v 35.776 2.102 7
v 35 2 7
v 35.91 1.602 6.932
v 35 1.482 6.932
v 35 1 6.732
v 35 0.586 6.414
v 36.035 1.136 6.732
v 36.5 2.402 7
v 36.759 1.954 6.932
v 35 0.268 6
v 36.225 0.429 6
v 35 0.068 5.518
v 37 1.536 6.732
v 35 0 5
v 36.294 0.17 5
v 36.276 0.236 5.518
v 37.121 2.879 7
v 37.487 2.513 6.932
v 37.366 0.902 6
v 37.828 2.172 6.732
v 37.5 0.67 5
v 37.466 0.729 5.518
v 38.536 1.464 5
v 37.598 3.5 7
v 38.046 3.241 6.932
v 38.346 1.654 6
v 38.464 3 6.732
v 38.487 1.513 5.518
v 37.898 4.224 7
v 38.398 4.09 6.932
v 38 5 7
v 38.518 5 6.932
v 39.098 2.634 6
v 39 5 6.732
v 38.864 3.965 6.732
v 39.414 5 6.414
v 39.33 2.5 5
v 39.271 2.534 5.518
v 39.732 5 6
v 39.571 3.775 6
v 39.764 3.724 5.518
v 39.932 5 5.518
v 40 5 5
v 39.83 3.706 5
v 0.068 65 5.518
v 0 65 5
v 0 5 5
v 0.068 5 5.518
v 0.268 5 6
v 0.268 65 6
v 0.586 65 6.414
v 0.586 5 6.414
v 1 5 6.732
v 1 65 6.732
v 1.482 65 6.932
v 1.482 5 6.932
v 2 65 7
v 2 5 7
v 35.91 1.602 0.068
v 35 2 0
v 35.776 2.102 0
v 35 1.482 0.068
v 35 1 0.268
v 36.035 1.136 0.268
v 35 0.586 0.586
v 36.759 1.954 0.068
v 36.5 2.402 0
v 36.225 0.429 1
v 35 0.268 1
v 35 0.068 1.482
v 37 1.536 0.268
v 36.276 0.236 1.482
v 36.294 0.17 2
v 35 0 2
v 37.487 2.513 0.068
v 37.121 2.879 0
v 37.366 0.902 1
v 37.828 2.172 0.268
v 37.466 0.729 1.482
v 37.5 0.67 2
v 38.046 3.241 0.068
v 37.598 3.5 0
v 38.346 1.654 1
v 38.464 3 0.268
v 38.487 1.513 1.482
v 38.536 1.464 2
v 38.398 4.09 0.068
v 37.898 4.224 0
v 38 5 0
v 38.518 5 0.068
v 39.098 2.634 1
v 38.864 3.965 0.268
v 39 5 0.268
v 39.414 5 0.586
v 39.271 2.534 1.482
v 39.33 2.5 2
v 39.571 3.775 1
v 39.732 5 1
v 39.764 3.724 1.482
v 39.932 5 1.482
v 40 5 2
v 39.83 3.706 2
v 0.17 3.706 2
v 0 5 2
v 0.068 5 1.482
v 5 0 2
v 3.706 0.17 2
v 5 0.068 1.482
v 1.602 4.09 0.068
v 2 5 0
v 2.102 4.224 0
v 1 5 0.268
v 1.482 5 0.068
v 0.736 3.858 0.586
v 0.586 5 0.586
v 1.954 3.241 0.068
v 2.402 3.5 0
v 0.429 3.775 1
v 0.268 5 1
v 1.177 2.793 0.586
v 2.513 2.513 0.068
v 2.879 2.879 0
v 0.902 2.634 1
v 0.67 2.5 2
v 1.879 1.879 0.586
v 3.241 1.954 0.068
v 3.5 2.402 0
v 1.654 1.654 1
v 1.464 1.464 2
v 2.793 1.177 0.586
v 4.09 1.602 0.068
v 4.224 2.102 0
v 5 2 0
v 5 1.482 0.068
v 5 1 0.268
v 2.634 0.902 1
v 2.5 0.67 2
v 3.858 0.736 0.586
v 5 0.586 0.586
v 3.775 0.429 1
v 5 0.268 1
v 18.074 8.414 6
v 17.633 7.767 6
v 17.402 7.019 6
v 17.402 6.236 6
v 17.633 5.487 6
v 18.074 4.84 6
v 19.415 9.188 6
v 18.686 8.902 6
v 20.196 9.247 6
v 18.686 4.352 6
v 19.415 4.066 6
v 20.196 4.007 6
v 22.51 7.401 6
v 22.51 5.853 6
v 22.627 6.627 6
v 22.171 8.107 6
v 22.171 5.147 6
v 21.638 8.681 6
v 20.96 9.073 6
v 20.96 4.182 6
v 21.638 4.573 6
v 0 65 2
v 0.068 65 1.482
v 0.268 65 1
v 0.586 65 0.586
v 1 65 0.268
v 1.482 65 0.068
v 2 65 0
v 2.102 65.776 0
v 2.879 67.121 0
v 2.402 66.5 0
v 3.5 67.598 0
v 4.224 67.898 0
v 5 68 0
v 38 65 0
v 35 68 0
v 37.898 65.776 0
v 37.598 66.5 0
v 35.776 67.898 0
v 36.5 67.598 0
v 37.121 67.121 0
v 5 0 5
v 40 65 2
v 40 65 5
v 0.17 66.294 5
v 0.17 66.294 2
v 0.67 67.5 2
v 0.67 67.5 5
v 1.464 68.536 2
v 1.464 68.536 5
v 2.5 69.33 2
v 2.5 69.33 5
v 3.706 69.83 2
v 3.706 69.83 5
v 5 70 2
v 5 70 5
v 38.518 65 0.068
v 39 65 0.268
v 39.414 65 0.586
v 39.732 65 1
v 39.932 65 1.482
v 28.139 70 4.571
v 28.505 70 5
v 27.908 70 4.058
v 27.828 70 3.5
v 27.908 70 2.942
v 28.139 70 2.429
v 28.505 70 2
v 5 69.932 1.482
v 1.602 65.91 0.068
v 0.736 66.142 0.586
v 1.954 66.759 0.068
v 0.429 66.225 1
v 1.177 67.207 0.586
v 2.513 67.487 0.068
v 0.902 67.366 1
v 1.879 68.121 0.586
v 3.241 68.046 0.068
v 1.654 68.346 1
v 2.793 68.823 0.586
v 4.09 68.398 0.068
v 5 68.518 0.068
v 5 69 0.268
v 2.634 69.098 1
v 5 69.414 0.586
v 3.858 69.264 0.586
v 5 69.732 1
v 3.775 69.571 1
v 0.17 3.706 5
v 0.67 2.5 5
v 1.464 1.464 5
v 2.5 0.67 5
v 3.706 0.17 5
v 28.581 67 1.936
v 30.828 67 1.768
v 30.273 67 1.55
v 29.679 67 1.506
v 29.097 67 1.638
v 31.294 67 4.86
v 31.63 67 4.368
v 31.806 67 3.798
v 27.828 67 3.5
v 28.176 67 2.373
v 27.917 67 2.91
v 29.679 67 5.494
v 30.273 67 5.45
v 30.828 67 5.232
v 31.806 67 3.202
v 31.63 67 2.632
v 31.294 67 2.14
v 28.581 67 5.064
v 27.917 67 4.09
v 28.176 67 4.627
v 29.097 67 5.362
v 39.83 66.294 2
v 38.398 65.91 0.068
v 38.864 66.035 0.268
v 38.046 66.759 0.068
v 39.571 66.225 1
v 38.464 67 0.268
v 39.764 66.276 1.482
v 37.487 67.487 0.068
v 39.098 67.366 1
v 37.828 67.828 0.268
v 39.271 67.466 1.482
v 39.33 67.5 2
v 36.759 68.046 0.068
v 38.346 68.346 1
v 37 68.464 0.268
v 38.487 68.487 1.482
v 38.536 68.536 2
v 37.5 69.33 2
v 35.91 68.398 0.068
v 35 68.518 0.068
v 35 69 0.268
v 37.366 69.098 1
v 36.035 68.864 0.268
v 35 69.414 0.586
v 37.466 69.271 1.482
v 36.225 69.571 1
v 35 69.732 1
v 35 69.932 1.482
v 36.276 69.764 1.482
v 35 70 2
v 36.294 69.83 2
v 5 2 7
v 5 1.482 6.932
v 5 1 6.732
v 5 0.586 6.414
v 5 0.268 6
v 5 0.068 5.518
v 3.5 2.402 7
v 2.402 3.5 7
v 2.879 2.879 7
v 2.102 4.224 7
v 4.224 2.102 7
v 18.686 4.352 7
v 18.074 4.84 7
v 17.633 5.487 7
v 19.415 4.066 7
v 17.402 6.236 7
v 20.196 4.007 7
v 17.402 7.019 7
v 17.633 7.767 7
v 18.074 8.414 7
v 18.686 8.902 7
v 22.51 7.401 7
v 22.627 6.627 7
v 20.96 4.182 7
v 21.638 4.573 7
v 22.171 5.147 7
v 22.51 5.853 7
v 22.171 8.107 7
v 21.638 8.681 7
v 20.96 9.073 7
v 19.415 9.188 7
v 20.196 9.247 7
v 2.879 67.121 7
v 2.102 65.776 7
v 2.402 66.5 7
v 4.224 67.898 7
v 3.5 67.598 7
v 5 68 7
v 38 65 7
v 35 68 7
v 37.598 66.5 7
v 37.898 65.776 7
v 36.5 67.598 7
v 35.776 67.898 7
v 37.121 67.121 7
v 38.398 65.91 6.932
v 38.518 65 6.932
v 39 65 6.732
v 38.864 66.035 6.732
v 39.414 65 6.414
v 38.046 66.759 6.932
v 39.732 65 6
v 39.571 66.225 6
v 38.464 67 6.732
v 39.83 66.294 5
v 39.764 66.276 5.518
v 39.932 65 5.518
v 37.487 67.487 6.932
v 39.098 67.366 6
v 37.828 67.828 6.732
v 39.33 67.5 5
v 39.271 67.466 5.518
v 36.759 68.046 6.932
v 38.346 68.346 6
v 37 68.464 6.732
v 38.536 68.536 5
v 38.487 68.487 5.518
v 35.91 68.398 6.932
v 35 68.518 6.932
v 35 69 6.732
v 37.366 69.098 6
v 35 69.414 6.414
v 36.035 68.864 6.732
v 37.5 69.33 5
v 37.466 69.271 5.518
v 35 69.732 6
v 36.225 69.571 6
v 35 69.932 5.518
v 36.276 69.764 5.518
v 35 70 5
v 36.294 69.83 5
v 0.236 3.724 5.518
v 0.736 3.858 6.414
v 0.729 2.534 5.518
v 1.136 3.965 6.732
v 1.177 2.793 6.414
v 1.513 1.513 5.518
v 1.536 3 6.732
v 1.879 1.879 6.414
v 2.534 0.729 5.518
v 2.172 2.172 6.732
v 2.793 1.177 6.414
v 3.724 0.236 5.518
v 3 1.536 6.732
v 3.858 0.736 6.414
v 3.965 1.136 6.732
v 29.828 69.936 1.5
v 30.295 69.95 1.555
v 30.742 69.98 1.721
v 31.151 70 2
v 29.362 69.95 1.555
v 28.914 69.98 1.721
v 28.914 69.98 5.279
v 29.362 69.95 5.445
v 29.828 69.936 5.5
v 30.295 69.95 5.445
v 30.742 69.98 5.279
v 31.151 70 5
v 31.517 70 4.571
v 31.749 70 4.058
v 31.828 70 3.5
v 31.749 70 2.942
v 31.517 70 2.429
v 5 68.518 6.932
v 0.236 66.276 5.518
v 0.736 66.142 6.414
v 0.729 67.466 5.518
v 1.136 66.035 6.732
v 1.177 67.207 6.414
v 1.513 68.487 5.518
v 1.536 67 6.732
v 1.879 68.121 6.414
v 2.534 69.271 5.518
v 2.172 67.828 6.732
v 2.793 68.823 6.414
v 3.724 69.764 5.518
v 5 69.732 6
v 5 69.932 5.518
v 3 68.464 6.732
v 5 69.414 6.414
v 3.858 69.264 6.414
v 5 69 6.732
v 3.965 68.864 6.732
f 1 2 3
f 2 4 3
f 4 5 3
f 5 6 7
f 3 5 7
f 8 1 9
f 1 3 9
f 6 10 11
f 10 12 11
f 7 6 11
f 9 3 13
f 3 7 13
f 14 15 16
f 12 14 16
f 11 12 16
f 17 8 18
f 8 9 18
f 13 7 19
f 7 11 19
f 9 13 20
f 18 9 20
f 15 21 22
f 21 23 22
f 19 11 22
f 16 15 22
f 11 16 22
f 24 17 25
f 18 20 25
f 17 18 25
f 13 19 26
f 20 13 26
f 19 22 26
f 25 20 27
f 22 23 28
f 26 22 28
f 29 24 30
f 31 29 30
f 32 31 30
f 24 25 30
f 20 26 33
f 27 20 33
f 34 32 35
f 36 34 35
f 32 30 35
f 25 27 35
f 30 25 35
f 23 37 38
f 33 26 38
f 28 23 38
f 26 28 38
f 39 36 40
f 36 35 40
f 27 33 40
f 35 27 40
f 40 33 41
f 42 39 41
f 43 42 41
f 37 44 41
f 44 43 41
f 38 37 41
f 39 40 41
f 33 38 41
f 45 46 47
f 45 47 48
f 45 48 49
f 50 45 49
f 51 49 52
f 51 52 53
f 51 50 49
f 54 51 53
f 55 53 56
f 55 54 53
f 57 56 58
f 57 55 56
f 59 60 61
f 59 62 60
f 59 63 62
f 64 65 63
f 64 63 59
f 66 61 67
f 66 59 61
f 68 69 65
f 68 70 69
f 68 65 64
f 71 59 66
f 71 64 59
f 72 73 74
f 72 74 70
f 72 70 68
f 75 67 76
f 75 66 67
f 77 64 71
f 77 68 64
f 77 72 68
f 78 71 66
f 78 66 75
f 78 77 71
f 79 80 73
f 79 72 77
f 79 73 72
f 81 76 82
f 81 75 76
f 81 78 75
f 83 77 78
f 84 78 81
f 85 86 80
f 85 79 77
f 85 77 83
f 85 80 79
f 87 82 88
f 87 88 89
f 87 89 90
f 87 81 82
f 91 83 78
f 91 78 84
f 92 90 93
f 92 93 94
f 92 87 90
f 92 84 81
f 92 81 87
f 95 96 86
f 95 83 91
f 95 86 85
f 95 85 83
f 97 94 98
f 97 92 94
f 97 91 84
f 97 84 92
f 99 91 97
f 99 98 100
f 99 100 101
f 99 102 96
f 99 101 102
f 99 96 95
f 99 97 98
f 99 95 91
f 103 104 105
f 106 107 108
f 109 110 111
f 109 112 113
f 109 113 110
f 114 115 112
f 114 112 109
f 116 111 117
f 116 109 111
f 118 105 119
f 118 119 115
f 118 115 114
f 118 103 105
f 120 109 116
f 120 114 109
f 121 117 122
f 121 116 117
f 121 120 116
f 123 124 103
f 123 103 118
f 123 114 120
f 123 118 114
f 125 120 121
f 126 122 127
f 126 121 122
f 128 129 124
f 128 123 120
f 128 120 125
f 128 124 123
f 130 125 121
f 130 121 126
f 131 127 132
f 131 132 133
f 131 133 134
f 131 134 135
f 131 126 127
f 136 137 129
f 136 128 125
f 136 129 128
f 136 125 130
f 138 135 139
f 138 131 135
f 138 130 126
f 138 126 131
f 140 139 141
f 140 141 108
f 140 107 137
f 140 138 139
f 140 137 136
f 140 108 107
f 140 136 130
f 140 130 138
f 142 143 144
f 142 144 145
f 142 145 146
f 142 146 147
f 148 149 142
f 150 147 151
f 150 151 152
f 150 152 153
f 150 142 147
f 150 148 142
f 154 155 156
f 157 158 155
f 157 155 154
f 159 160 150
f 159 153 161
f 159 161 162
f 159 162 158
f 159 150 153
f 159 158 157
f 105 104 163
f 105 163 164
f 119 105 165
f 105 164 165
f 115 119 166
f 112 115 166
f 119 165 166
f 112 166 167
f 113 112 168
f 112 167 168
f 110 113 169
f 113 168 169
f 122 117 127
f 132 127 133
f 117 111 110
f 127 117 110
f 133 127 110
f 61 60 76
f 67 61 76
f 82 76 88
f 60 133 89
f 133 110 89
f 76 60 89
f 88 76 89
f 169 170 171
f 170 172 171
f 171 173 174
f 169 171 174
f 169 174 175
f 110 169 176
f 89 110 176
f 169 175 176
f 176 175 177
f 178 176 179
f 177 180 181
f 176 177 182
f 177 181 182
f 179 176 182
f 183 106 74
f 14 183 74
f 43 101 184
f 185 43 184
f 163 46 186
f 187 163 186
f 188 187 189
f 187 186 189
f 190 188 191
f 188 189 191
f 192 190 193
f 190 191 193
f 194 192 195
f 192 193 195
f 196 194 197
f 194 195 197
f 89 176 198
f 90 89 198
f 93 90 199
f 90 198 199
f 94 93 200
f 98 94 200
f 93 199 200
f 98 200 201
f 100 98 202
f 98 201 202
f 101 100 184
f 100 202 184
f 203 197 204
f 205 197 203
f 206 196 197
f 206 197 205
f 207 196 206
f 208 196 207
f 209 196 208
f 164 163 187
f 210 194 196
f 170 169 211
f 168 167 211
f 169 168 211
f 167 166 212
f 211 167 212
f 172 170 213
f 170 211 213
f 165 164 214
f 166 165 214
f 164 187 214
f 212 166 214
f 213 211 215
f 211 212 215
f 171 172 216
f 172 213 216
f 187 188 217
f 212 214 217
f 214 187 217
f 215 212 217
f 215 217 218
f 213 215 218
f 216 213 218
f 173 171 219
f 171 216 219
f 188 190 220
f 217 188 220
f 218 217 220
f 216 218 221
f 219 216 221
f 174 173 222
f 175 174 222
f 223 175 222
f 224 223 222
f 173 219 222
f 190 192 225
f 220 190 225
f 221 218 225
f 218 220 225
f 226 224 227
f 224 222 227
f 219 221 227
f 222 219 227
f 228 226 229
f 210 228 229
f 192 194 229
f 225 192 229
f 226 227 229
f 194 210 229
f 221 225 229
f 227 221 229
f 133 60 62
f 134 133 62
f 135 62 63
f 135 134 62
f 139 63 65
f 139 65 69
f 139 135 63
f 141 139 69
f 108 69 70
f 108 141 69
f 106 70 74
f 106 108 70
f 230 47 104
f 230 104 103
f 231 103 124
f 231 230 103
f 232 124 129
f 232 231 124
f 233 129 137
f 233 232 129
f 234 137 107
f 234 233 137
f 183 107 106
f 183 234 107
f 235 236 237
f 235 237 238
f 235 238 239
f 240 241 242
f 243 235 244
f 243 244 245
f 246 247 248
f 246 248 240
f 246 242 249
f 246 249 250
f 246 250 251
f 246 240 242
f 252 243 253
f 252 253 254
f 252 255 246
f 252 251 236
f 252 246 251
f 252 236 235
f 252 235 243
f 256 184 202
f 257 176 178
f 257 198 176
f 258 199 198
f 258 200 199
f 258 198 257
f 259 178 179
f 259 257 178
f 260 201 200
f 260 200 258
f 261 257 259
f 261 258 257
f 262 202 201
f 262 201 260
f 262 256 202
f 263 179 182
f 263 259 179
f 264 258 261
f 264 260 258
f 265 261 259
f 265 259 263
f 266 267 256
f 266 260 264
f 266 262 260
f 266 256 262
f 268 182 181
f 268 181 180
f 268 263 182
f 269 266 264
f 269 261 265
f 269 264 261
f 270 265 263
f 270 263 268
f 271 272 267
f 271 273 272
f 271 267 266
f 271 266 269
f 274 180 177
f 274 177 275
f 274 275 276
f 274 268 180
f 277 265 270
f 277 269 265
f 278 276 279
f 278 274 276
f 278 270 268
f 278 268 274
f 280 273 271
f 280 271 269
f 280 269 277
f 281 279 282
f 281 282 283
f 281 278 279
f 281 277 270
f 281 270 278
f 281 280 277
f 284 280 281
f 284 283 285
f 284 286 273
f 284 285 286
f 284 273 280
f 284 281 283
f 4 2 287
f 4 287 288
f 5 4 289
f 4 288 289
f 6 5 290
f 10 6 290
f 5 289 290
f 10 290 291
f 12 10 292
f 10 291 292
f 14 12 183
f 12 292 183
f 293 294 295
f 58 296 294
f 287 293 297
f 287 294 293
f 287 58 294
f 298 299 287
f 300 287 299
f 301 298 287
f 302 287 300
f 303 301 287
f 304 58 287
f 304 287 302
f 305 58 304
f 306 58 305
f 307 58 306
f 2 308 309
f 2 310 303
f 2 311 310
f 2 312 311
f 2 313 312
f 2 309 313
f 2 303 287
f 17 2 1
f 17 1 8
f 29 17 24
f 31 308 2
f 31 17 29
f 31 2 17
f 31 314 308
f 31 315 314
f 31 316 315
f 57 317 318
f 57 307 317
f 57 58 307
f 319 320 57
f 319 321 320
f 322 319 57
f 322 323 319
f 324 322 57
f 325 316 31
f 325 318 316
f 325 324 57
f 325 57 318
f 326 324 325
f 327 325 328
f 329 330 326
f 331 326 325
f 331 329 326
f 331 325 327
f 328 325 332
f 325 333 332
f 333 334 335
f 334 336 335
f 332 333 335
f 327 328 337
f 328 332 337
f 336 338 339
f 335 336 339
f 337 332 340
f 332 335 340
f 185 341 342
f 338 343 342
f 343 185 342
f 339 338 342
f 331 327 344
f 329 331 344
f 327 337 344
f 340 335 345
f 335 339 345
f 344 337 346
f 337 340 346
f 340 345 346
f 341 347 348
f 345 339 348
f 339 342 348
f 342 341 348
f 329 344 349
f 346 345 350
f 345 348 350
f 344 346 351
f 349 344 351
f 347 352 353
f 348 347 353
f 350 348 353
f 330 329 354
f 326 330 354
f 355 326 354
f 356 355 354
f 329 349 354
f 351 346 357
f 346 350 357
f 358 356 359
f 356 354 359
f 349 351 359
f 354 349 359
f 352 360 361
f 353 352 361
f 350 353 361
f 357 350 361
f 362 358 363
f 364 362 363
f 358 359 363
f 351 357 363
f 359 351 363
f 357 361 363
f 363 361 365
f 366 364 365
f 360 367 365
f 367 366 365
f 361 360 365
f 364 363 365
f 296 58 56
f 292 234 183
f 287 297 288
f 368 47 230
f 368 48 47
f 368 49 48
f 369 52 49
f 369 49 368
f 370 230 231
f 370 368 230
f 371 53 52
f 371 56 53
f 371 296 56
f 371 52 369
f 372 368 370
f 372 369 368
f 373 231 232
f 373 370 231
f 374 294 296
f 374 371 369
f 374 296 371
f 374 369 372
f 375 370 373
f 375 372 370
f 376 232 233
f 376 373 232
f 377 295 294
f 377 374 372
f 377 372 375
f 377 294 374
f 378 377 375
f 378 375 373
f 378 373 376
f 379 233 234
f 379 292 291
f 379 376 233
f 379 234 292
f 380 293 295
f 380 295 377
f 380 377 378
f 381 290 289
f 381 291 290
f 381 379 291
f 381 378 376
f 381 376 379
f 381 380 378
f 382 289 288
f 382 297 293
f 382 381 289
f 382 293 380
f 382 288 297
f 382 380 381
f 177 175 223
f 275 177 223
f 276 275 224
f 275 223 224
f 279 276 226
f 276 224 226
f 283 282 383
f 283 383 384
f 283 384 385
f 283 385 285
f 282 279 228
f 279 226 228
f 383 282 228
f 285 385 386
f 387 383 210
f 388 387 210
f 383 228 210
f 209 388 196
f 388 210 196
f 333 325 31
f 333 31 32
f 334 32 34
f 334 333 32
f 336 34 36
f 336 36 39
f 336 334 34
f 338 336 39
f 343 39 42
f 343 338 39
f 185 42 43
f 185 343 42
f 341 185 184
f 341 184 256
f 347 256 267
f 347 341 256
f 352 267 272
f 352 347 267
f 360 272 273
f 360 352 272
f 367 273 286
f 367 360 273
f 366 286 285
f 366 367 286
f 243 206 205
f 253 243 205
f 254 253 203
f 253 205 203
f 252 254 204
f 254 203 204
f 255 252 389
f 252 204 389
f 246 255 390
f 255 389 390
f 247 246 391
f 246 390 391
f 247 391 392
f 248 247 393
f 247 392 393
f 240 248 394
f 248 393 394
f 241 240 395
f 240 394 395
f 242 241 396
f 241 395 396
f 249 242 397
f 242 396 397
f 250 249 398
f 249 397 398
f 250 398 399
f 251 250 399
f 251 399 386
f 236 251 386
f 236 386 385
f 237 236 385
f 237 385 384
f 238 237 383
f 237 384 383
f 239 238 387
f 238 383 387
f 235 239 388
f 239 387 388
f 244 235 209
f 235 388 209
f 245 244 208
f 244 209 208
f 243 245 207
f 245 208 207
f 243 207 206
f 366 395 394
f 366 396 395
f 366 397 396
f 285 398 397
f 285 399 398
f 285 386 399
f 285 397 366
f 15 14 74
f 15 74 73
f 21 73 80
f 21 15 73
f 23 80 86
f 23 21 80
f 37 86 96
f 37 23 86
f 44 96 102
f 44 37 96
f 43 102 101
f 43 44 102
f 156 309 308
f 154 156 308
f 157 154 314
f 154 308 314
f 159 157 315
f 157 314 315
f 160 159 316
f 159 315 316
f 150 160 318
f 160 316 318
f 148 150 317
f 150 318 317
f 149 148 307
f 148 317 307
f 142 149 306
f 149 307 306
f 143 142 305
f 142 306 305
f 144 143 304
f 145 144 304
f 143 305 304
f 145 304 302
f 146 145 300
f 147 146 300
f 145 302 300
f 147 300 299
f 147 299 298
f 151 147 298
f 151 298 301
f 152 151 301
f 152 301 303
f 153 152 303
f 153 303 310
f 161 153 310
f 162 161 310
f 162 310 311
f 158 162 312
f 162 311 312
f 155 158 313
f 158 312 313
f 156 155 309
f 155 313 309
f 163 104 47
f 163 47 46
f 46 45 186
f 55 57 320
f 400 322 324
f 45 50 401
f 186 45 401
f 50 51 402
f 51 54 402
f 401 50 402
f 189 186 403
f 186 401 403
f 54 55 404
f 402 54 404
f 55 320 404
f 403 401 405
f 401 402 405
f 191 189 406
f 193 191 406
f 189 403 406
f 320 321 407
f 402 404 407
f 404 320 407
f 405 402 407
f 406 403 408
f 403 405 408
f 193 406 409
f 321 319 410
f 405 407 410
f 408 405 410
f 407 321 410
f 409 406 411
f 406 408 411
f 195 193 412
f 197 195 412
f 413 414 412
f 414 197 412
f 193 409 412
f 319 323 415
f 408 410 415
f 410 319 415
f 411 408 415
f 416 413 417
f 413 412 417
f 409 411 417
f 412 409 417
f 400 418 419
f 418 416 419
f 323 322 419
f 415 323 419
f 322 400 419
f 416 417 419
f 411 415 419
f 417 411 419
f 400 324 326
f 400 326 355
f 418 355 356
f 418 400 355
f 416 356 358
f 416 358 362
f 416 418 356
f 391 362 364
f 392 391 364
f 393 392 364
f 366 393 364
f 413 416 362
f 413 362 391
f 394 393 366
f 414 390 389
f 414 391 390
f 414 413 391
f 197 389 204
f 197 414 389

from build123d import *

# Parameters (mm, degrees)
F0_W         = 40
F0_H         = 70
F1_DEPTH     = 7
F2_R         = 5
F3_R         = 2
F4_DEPTH     = 3
F5_T1_DEPTH  = 60
F5_T3_DEPTH  = 30
F5_T6_ANGLE  = 90
F5_T8_ANGLE  = 90
F5_T10_ANGLE = 90
F5_T12_ANGLE = 90
F5_T14_ANGLE = 90
F5_T16_ANGLE = 90
F5_T18_ANGLE = 90
F5_T20_ANGLE = 90
F6_R         = 2.6271107644
F7_DEPTH     = 1


# Not quite as in the source:
# - a fillet or chamfer that OpenCascade refuses, or shapes differently, is made with other operations: its cross-section is extruded or revolved along the edge and cut away or added


with BuildPart() as f1:
    # F0 (on Top) → F1 (new body)
    with BuildSketch(Plane.XY):
        with Locations((20, 35)):
            Rectangle(F0_W, F0_H)
    extrude(amount=F1_DEPTH)

    # F2
    f2_edges = [f1.edges().sort_by_distance(p)[0] for p in [
        (40, 70, 3.5),
        (0, 70, 3.5),
        (40, 0, 3.5),
        (0, 0, 3.5),
    ]]
    fillet(f2_edges, radius=F2_R)

    # F3 (on face) → F4 (cut)
    with BuildSketch(Plane(origin=(0, 70, 0), x_dir=(-1, 0, 0), z_dir=(0, 1, 0))):
        with Locations((-29.8281734893, 3.5)):
            Circle(F3_R)
    extrude(amount=-F4_DEPTH, mode=Mode.SUBTRACT)

    # F5: fillet of radius 2 on 16 edges, made by hand

    # F5_s2 → F5_t1 (cut)
    with BuildSketch(Plane.XZ.offset(-65)):
        with BuildLine():
            ThreePointArc((0, 5), (0.5857864376, 6.4142135624), (2, 7))
            Line((2, 7), (0, 7))
            Line((0, 7), (0, 5))
        make_face()
        with BuildLine():
            ThreePointArc((0, 2), (0.5857864376, 0.5857864376), (2, 0))
            Line((2, 0), (0, 0))
            Line((0, 0), (0, 2))
        make_face()
        with BuildLine():
            ThreePointArc((38, 0), (39.4142135624, 0.5857864376), (40, 2))
            Line((40, 2), (40, 0))
            Line((40, 0), (38, 0))
        make_face()
        with BuildLine():
            ThreePointArc((38, 7), (39.4142135624, 6.4142135624), (40, 5))
            Line((40, 5), (40, 7))
            Line((40, 7), (38, 7))
        make_face()
    extrude(amount=F5_T1_DEPTH, mode=Mode.SUBTRACT)

    # F5_s4 → F5_t3 (cut)
    with BuildSketch(Plane.YZ.offset(5)):
        with BuildLine():
            ThreePointArc((68, 0), (69.4142135624, 0.5857864376), (70, 2))
            Line((70, 2), (70, 0))
            Line((70, 0), (68, 0))
        make_face()
        with BuildLine():
            ThreePointArc((2, 0), (0.5857864376, 0.5857864376), (0, 2))
            Line((0, 2), (0, 0))
            Line((0, 0), (2, 0))
        make_face()
        with BuildLine():
            ThreePointArc((68, 7), (69.4142135624, 6.4142135624), (70, 5))
            Line((70, 5), (70, 7))
            Line((70, 7), (68, 7))
        make_face()
        with BuildLine():
            ThreePointArc((2, 7), (0.5857864376, 6.4142135624), (0, 5))
            Line((0, 5), (0, 7))
            Line((0, 7), (2, 7))
        make_face()
    extrude(amount=F5_T3_DEPTH, mode=Mode.SUBTRACT)

    # F5_s5 → F5_t6 (revolve, cut)
    with BuildSketch(Plane.XZ.offset(-65)):
        with BuildLine():
            ThreePointArc((2, 0), (0.5857864376, 0.5857864376), (0, 2))
            Line((0, 2), (0, 0))
            Line((0, 0), (2, 0))
        make_face()
    revolve(axis=Axis((5, 65, 0), (0, 0, -1)), revolution_arc=F5_T6_ANGLE, mode=Mode.SUBTRACT)

    # F5_s7 → F5_t8 (revolve, cut)
    with BuildSketch(Plane.XZ.offset(-5)):
        with BuildLine():
            ThreePointArc((2, 0), (0.5857864376, 0.5857864376), (0, 2))
            Line((0, 2), (0, 0))
            Line((0, 0), (2, 0))
        make_face()
    revolve(axis=Axis((5, 5, 0), (0, 0, 1)), revolution_arc=F5_T8_ANGLE, mode=Mode.SUBTRACT)

    # F5_s9 → F5_t10 (revolve, cut)
    with BuildSketch(Plane.XZ.offset(-65)):
        with BuildLine():
            ThreePointArc((38, 0), (39.4142135624, 0.5857864376), (40, 2))
            Line((40, 2), (40, 0))
            Line((40, 0), (38, 0))
        make_face()
    revolve(axis=Axis((35, 65, 0), (0, 0, 1)), revolution_arc=F5_T10_ANGLE, mode=Mode.SUBTRACT)

    # F5_s11 → F5_t12 (revolve, cut)
    with BuildSketch(Plane.YZ.offset(35)):
        with BuildLine():
            ThreePointArc((2, 0), (0.5857864376, 0.5857864376), (0, 2))
            Line((0, 2), (0, 0))
            Line((0, 0), (2, 0))
        make_face()
    revolve(axis=Axis((35, 5, 0), (0, 0, 1)), revolution_arc=F5_T12_ANGLE, mode=Mode.SUBTRACT)

    # F5_s13 → F5_t14 (revolve, cut)
    with BuildSketch(Plane.XZ.offset(-65)):
        with BuildLine():
            ThreePointArc((0, 5), (0.5857864376, 6.4142135624), (2, 7))
            Line((2, 7), (0, 7))
            Line((0, 7), (0, 5))
        make_face()
    revolve(axis=Axis((5, 65, 7), (0, 0, -1)), revolution_arc=F5_T14_ANGLE, mode=Mode.SUBTRACT)

    # F5_s15 → F5_t16 (revolve, cut)
    with BuildSketch(Plane.XZ.offset(-5)):
        with BuildLine():
            ThreePointArc((0, 5), (0.5857864376, 6.4142135624), (2, 7))
            Line((2, 7), (0, 7))
            Line((0, 7), (0, 5))
        make_face()
    revolve(axis=Axis((5, 5, 7), (0, 0, 1)), revolution_arc=F5_T16_ANGLE, mode=Mode.SUBTRACT)

    # F5_s17 → F5_t18 (revolve, cut)
    with BuildSketch(Plane.XZ.offset(-65)):
        with BuildLine():
            ThreePointArc((38, 7), (39.4142135624, 6.4142135624), (40, 5))
            Line((40, 5), (40, 7))
            Line((40, 7), (38, 7))
        make_face()
    revolve(axis=Axis((35, 65, 7), (0, 0, 1)), revolution_arc=F5_T18_ANGLE, mode=Mode.SUBTRACT)

    # F5_s19 → F5_t20 (revolve, cut)
    with BuildSketch(Plane.YZ.offset(35)):
        with BuildLine():
            ThreePointArc((2, 7), (0.5857864376, 6.4142135624), (0, 5))
            Line((0, 5), (0, 7))
            Line((0, 7), (2, 7))
        make_face()
    revolve(axis=Axis((35, 5, 7), (0, 0, 1)), revolution_arc=F5_T20_ANGLE, mode=Mode.SUBTRACT)

    # F6 (on face) → F7 (cut)
    with BuildSketch(Plane.XY.offset(7)):
        with Locations((20, 6.6271107644)):
            Circle(F6_R)
    extrude(amount=-F7_DEPTH, mode=Mode.SUBTRACT)


solid = f1.part
